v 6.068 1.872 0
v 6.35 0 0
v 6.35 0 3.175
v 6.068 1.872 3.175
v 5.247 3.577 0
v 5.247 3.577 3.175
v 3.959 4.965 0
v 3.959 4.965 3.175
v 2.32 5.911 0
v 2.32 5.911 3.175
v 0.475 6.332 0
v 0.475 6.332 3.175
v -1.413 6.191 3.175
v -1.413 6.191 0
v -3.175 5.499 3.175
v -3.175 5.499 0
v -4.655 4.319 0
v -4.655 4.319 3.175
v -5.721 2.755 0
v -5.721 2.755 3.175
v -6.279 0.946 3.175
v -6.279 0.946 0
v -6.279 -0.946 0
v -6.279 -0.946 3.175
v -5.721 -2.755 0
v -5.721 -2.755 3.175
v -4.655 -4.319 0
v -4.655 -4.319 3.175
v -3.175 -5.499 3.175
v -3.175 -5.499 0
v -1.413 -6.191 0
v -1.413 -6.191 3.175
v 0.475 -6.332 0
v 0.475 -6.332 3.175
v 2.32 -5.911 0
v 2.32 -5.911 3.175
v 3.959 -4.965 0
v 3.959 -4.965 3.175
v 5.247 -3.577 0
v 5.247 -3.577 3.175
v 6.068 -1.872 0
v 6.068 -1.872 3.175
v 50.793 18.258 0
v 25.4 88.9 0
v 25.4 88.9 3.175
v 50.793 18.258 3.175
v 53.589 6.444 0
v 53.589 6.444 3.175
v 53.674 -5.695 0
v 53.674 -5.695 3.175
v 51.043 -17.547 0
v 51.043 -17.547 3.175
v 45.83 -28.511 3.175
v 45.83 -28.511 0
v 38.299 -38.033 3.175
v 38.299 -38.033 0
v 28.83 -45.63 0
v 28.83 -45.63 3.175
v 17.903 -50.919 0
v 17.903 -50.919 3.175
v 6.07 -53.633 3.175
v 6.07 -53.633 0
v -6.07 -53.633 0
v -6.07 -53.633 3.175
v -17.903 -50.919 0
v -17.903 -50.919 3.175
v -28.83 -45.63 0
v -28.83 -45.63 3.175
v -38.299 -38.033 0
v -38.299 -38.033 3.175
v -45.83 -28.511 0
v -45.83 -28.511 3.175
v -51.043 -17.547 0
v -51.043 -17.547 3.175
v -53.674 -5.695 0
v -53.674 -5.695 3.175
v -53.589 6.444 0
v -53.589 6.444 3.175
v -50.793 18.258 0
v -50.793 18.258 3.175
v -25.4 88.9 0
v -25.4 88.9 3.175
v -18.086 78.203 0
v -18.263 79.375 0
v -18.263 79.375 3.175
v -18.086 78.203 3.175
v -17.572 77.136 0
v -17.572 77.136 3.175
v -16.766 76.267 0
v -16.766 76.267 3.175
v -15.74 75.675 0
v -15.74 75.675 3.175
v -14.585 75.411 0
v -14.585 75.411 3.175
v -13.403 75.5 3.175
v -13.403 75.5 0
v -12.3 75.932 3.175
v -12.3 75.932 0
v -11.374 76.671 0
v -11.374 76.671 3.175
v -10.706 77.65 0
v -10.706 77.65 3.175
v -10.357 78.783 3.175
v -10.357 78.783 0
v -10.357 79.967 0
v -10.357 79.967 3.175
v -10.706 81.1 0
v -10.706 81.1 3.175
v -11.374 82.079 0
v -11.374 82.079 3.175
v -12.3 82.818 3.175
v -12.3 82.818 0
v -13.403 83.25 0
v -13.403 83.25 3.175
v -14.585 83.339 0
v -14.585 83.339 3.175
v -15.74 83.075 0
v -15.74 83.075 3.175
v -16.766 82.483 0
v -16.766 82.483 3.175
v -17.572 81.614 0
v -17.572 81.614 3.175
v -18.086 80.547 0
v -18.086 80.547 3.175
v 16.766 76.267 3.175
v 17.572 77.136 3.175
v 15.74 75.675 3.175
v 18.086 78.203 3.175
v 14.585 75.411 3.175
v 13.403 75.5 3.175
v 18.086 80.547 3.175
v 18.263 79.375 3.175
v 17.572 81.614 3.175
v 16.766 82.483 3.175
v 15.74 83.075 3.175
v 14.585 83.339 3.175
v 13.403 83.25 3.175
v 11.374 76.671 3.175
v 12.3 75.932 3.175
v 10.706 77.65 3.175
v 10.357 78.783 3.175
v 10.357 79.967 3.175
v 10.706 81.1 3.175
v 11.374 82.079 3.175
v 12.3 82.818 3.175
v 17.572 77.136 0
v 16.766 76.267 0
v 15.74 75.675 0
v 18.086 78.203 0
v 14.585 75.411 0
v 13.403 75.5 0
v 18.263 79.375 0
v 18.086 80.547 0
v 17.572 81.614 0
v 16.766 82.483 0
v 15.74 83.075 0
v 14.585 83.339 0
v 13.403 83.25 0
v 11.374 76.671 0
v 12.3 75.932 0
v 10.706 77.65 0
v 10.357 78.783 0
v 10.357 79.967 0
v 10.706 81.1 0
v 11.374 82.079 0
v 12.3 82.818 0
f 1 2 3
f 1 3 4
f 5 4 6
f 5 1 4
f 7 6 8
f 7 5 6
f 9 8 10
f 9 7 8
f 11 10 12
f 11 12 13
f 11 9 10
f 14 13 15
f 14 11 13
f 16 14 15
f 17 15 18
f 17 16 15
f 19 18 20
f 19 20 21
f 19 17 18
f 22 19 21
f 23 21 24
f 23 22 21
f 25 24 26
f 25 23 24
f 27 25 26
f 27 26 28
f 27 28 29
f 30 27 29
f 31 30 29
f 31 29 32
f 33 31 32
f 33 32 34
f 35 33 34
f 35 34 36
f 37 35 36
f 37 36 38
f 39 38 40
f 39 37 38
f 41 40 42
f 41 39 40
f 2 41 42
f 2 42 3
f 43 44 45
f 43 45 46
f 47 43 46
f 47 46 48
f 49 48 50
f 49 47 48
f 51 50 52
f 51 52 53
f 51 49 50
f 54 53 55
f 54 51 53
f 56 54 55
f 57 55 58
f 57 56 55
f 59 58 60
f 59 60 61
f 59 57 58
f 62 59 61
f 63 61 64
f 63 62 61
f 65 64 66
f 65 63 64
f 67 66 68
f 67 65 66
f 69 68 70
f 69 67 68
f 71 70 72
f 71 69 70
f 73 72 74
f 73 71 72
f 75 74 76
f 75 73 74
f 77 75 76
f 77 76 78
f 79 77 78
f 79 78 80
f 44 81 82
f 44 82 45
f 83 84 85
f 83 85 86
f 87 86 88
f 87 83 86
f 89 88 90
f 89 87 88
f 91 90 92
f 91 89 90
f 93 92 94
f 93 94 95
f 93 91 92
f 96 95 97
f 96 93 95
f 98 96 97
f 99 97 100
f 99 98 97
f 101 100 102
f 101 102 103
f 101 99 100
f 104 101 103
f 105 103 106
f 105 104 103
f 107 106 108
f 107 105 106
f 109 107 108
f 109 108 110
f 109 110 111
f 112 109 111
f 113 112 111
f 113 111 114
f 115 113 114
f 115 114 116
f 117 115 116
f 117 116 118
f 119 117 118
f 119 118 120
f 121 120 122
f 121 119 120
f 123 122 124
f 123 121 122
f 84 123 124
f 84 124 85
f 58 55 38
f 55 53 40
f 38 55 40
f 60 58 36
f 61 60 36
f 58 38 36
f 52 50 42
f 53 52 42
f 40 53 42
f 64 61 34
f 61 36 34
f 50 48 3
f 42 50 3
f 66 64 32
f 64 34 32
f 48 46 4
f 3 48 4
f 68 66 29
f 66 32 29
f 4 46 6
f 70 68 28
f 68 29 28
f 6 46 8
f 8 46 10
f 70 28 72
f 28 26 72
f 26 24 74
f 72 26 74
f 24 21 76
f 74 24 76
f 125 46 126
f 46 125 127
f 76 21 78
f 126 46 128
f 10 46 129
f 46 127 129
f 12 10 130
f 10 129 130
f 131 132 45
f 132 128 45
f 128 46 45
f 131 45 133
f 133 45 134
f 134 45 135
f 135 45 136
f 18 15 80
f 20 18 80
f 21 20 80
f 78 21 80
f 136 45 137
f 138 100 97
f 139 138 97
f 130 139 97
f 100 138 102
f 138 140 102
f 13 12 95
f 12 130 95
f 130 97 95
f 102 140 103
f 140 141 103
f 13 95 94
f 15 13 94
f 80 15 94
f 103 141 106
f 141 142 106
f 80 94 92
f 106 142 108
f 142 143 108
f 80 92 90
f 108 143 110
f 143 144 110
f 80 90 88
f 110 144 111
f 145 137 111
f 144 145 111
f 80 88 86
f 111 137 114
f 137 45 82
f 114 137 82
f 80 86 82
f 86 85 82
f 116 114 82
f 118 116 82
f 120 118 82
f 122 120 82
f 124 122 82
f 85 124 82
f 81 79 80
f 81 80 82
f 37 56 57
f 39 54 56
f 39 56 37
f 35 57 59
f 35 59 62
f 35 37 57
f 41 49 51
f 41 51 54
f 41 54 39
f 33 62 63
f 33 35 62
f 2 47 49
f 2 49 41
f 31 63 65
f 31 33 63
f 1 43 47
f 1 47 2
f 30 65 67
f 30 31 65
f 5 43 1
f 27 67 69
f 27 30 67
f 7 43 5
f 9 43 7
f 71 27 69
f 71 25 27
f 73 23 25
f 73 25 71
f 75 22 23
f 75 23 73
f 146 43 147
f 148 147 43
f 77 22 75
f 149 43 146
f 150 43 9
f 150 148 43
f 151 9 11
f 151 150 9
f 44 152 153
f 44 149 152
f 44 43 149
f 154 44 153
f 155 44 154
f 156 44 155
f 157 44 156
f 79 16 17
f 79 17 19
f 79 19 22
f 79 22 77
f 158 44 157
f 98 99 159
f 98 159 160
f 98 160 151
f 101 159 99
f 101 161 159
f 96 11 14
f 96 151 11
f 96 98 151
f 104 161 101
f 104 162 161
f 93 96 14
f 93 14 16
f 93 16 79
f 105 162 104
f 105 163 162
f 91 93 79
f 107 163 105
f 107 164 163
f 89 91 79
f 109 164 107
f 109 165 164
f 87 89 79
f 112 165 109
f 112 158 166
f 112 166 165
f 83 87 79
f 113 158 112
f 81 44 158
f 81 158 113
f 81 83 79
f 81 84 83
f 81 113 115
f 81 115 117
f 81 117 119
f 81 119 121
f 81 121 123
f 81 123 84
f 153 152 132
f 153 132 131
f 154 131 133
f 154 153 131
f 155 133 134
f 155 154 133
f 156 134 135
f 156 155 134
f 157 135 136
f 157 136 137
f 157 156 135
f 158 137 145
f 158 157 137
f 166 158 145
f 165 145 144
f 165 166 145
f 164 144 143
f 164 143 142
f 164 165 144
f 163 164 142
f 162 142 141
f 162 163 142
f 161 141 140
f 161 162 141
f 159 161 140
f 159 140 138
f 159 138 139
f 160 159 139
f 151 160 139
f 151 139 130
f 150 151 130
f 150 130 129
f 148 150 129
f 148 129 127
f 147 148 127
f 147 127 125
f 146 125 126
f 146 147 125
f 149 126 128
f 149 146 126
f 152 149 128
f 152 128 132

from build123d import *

# Parameters (mm, degrees)
SKETCH1_R           = 3.9751
SKETCH1_R_2         = 6.35
BOSS_EXTRUDE1_DEPTH = 3.175


with BuildPart() as part:
    # Sketch1 → Boss-Extrude1 (new body)
    with BuildSketch(Plane.XY):
        with BuildLine():
            Line((-25.4, 88.9), (25.4, 88.9))
            Line((25.4, 88.9), (50.793088675, 18.258224664))
            ThreePointArc((50.793088675, 18.258224664), (0, -53.975), (-50.793088675, 18.258224664))
            Line((-50.793088675, 18.258224664), (-25.4, 88.9))
        make_face()
        with Locations((14.2875, 79.375)):
            Circle(SKETCH1_R, mode=Mode.SUBTRACT)
        with Locations(Location((-14.2875, 79.375, 0), (0, 0, 180))):
            Circle(SKETCH1_R, mode=Mode.SUBTRACT)
        Circle(SKETCH1_R_2, mode=Mode.SUBTRACT)
    extrude(amount=BOSS_EXTRUDE1_DEPTH)


solid = part.part
